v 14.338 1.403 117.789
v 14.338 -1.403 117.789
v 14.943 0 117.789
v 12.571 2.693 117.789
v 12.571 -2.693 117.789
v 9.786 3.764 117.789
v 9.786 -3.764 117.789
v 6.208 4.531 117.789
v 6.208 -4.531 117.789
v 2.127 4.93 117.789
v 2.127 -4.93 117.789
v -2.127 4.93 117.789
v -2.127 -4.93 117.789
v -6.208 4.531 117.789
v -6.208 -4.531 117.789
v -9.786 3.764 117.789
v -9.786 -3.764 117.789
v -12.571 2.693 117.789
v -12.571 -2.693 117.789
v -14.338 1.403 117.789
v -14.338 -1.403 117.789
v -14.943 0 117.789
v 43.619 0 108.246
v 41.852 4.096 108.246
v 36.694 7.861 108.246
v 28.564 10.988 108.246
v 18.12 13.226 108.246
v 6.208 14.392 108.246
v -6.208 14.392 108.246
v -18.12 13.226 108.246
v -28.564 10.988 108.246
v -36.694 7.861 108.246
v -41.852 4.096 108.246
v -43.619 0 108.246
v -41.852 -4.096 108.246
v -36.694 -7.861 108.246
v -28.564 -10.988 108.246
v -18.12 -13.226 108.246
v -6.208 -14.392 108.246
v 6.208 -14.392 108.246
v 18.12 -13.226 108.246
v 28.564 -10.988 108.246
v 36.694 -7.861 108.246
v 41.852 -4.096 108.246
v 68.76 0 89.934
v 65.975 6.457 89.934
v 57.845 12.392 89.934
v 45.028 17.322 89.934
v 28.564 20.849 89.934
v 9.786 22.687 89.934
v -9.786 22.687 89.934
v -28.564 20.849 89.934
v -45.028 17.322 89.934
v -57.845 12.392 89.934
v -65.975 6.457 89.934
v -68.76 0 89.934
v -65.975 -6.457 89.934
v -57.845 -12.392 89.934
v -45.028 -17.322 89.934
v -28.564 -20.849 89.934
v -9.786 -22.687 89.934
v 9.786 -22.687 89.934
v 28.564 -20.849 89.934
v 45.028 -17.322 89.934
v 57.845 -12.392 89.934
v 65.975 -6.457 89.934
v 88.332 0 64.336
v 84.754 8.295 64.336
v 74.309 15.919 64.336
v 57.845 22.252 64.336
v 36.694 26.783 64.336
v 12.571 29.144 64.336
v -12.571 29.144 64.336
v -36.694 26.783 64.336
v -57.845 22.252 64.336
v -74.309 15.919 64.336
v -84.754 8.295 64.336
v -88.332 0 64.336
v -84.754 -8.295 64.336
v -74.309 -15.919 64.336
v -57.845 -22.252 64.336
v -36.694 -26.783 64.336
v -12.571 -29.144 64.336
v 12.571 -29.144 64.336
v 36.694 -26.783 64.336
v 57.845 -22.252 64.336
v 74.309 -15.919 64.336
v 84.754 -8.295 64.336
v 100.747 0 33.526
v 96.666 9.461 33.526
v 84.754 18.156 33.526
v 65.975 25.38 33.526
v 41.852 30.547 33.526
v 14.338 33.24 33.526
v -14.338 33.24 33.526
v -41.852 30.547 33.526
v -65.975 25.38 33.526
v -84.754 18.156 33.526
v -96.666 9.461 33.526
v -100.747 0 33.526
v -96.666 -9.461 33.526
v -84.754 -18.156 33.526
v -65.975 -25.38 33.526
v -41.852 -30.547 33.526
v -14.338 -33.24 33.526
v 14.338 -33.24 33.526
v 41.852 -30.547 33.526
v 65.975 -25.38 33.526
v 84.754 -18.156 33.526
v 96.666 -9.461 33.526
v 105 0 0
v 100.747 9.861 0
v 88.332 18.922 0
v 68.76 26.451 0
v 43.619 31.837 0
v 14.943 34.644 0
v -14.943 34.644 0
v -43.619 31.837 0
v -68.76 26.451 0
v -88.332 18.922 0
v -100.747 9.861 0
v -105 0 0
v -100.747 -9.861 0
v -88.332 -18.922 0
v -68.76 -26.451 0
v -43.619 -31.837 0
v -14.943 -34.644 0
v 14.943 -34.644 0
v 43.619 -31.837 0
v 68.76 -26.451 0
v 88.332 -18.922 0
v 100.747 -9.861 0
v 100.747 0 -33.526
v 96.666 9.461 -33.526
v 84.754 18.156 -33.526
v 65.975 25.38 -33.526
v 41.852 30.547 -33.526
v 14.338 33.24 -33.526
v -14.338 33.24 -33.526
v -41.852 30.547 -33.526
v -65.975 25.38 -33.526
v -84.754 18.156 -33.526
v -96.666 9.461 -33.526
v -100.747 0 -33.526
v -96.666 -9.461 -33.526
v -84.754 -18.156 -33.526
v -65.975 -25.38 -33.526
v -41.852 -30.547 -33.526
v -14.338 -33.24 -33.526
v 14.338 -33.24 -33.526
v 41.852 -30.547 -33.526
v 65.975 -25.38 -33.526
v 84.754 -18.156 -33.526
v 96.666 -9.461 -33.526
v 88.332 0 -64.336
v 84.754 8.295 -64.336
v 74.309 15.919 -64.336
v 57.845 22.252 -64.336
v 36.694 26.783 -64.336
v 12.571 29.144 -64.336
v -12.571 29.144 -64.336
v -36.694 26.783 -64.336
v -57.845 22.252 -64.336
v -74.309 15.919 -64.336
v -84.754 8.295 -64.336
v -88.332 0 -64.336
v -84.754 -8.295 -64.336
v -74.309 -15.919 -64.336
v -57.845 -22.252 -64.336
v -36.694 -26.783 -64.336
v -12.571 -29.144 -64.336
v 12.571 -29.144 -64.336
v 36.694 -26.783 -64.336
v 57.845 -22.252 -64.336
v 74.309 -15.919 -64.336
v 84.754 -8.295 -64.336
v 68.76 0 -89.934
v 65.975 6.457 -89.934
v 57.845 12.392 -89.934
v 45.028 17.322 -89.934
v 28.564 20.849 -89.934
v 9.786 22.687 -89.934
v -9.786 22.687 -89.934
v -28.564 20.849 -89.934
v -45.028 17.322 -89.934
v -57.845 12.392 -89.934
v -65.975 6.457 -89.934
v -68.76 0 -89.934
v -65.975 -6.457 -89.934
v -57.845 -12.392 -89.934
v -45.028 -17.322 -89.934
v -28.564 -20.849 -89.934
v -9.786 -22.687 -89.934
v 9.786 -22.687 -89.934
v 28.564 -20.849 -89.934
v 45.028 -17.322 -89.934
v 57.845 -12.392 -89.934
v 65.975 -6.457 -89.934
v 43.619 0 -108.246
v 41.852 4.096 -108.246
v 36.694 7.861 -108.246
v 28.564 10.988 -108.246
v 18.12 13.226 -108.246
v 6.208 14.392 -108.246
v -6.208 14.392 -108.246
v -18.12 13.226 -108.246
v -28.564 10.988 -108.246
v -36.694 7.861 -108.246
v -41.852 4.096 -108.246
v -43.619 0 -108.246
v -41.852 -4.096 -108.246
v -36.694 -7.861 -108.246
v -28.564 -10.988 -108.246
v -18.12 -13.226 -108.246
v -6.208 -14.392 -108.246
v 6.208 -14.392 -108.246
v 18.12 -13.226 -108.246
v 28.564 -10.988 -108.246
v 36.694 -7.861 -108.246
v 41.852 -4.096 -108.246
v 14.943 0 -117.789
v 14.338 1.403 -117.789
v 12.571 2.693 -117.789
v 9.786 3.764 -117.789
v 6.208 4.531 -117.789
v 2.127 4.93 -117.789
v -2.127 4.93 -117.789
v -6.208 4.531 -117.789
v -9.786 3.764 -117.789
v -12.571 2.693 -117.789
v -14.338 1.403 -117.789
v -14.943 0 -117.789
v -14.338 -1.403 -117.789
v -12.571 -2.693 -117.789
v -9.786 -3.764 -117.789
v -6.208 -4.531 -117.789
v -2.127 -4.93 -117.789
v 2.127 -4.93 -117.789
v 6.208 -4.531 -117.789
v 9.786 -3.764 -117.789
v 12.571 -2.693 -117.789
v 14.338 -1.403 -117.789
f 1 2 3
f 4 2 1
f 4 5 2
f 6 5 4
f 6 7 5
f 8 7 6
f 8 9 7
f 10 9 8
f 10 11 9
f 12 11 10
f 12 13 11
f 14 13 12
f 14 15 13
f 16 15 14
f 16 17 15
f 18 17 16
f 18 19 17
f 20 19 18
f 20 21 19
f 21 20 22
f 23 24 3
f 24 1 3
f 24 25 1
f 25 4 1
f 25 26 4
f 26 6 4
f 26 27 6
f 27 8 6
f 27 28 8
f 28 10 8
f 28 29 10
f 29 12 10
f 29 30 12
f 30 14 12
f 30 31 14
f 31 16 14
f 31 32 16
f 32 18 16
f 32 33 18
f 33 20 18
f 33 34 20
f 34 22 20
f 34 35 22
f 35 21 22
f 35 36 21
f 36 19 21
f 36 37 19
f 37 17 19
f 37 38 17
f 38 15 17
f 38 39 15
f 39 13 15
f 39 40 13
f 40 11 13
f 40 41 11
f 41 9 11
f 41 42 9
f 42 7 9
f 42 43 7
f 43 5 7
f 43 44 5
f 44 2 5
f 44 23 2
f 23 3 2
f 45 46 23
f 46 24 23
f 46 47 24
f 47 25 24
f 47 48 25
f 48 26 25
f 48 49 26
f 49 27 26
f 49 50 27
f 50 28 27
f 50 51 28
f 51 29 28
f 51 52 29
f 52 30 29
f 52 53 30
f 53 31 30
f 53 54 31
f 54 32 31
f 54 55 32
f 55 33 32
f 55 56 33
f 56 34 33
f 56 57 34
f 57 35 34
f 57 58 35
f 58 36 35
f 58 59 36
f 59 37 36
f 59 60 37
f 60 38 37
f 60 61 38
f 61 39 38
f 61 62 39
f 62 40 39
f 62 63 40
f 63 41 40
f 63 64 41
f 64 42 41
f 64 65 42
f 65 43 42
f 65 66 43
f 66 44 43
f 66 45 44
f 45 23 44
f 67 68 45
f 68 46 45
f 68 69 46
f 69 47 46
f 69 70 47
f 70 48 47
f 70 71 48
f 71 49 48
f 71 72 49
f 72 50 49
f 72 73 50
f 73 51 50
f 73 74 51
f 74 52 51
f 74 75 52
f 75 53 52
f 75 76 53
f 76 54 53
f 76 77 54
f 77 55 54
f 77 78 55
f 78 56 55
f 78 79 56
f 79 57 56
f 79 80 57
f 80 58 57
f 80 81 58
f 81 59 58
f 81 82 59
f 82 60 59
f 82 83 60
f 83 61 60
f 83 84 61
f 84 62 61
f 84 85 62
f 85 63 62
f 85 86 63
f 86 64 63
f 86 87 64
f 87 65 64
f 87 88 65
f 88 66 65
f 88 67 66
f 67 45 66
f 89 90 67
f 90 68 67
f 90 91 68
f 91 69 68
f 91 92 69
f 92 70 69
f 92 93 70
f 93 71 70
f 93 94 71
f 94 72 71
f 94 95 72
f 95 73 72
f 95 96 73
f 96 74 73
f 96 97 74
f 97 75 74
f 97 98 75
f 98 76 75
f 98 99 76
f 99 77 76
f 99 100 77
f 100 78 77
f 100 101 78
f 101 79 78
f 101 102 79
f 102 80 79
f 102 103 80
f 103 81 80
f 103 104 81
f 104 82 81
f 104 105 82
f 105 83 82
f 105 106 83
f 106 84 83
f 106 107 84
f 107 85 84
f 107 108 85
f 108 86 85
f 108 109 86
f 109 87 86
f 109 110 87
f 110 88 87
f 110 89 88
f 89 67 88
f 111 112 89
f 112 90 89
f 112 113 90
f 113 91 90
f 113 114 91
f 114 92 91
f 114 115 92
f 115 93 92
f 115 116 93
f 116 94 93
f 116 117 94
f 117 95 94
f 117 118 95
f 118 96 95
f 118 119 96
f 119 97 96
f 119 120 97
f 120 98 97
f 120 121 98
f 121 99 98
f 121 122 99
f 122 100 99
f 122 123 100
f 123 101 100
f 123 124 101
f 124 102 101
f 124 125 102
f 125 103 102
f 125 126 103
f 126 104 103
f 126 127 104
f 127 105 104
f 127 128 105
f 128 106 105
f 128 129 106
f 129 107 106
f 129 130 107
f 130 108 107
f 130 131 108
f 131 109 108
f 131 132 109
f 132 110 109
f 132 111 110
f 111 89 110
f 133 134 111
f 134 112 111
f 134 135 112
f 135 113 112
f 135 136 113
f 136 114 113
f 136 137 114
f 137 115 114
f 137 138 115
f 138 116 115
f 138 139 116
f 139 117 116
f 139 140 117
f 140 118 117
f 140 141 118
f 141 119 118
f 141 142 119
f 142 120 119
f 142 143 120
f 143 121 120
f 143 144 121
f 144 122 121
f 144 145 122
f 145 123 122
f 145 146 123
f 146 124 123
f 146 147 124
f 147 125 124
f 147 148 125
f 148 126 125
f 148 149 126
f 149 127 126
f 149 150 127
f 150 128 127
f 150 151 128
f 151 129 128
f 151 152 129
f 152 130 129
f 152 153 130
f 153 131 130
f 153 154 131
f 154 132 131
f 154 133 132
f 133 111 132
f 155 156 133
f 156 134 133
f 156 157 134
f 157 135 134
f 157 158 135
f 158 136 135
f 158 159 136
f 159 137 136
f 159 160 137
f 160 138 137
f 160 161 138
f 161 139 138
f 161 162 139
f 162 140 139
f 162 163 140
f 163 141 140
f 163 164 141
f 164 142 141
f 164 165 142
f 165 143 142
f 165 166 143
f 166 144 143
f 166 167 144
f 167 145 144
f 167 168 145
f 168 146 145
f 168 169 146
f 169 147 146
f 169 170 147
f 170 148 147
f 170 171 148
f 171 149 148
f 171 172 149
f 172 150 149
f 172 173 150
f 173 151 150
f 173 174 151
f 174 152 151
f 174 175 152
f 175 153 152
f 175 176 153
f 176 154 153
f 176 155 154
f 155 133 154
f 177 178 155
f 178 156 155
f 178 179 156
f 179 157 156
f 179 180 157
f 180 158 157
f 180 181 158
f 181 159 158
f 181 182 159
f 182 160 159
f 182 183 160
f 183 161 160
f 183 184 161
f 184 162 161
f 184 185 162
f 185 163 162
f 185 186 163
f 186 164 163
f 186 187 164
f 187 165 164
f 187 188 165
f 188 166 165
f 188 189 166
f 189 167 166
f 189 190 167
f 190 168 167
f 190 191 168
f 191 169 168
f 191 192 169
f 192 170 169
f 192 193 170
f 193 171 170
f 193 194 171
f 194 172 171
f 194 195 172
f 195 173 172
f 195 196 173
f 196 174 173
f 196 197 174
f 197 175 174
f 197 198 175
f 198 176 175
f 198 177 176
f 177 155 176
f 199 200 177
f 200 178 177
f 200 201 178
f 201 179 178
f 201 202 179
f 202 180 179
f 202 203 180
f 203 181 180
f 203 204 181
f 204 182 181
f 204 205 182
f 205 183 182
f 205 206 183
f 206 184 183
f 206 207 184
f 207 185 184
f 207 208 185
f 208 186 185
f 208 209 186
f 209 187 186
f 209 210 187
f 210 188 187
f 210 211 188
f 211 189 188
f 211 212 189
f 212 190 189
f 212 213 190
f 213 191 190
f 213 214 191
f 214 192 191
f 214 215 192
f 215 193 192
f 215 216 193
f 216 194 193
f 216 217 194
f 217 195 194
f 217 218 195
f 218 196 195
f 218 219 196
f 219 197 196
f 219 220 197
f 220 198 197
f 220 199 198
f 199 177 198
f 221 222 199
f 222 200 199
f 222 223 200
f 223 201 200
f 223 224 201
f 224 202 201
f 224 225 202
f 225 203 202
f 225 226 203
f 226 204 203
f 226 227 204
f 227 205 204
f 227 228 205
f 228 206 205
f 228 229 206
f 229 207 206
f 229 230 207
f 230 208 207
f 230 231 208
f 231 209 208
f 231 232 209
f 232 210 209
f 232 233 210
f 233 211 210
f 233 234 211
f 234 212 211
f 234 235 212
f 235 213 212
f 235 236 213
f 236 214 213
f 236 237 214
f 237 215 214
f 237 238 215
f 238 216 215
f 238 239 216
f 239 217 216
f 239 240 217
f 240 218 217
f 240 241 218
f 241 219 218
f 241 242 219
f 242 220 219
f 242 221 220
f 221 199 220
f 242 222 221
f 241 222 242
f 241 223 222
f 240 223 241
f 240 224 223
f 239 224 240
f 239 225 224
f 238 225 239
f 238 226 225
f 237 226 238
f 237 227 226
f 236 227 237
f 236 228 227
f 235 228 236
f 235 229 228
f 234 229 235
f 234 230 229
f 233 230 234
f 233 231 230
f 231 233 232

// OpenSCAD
// Generated by SolidPython 1.0.1 on 2020-07-29 00:46:51


scale(v = [15, 5, 17]) {
	sphere(r = 7);
}
/***********************************************
*********      SolidPython code:      **********
************************************************
 
# import packages: SolidPython
from solid import *
from solid.utils import *
from itertools import chain, combinations, permutations


class Resize:

    def __init__(self, scad_file):
        self.scad_file = scad_file
        #self.scad_file = import_scad(scad_file)
        # cone/cylinder param:
        self.r1 = 0
        self.r2 = 0
        self.h = 0
        # rectangular prism param:
        self.w = 0
        self.l = 0
        # ellipse param:
        self.r = 0

    # import OpenScad code (file name corresponds to shape)


    # classify shape + parameters
    def assign(self, param1, param2, param3):
        if self.scad_file == 'cone.scad':
            self.r1 = param1
            self.r2 = param2
            self.h = param3
        elif self.scad_file == 'cylinder.scad':
            self.r1 = param1
            self.r2 = param2
            self.h = param3
        elif self.scad_file == 'rectangularPrism.scad':
            self.h = param1
            self.l = param2
            self.w = param3
        else:
            self.r = param1
            self.h = param2

    # resize parameters
    def iterate(self):
        x = range(3, 20, 2)
        i = 1
        if self.scad_file == 'cone.scad':
            tempList = list(permutations(x, 2))
            for temp in tempList:
                param1 = temp[0]
                param2 = temp[1]
                filepath = 'produced_scad_files/' + 'cone' + str(param1) + '_' + str(param2) + '_' + '.scad'
                scad_render_to_file(cylinder(h=param1, r1=param2, r2=0), filepath)

        elif self.scad_file == 'cylinder.scad':
            tempList = list(permutations(x, 3))
            for temp in tempList:
                param1 = temp[0]
                param2 = temp[1]
                filepath = 'produced_scad_files/' + 'cylinder' + str(param1) + '_' + str(param2) + '_' + '.scad'
                scad_render_to_file(cylinder(h=param1, r1=param2, r2=param2), filepath)

        elif self.scad_file == 'rectangularPrism.scad':
            tempList = list(permutations(x, 3))
            for temp in tempList:
                param1 = temp[0]
                param2 = temp[1]
                param3 = temp[2]
                filepath = 'produced_scad_files/' + 'rectangularPrism' + str(param1) + '_' + str(param2) + '_' + str(
                    param3) + '.scad'
                scad_render_to_file(cube(size=(param1, param2, param3)), filepath)

        elif self.scad_file == 'ellipse.scad':
            tempList = list(permutations(x, 4))
            for temp in tempList:
                param1 = temp[0]
                param2 = temp[1]
                param3 = temp[2]
                param4 = temp[3]
                filepath = 'produced_scad_files/' + 'ellipse' + str(param1) + '_' + str(param2) + '_' + str(param3) + '_' + str(param4) + '.scad'
                scad_render_to_file(scale([param1, param2, param3])(sphere(r=param4)), filepath)

    def render_to_scadfile(self):
        scad_render_to_file(scad, 'example.scad') 
 
************************************************/
